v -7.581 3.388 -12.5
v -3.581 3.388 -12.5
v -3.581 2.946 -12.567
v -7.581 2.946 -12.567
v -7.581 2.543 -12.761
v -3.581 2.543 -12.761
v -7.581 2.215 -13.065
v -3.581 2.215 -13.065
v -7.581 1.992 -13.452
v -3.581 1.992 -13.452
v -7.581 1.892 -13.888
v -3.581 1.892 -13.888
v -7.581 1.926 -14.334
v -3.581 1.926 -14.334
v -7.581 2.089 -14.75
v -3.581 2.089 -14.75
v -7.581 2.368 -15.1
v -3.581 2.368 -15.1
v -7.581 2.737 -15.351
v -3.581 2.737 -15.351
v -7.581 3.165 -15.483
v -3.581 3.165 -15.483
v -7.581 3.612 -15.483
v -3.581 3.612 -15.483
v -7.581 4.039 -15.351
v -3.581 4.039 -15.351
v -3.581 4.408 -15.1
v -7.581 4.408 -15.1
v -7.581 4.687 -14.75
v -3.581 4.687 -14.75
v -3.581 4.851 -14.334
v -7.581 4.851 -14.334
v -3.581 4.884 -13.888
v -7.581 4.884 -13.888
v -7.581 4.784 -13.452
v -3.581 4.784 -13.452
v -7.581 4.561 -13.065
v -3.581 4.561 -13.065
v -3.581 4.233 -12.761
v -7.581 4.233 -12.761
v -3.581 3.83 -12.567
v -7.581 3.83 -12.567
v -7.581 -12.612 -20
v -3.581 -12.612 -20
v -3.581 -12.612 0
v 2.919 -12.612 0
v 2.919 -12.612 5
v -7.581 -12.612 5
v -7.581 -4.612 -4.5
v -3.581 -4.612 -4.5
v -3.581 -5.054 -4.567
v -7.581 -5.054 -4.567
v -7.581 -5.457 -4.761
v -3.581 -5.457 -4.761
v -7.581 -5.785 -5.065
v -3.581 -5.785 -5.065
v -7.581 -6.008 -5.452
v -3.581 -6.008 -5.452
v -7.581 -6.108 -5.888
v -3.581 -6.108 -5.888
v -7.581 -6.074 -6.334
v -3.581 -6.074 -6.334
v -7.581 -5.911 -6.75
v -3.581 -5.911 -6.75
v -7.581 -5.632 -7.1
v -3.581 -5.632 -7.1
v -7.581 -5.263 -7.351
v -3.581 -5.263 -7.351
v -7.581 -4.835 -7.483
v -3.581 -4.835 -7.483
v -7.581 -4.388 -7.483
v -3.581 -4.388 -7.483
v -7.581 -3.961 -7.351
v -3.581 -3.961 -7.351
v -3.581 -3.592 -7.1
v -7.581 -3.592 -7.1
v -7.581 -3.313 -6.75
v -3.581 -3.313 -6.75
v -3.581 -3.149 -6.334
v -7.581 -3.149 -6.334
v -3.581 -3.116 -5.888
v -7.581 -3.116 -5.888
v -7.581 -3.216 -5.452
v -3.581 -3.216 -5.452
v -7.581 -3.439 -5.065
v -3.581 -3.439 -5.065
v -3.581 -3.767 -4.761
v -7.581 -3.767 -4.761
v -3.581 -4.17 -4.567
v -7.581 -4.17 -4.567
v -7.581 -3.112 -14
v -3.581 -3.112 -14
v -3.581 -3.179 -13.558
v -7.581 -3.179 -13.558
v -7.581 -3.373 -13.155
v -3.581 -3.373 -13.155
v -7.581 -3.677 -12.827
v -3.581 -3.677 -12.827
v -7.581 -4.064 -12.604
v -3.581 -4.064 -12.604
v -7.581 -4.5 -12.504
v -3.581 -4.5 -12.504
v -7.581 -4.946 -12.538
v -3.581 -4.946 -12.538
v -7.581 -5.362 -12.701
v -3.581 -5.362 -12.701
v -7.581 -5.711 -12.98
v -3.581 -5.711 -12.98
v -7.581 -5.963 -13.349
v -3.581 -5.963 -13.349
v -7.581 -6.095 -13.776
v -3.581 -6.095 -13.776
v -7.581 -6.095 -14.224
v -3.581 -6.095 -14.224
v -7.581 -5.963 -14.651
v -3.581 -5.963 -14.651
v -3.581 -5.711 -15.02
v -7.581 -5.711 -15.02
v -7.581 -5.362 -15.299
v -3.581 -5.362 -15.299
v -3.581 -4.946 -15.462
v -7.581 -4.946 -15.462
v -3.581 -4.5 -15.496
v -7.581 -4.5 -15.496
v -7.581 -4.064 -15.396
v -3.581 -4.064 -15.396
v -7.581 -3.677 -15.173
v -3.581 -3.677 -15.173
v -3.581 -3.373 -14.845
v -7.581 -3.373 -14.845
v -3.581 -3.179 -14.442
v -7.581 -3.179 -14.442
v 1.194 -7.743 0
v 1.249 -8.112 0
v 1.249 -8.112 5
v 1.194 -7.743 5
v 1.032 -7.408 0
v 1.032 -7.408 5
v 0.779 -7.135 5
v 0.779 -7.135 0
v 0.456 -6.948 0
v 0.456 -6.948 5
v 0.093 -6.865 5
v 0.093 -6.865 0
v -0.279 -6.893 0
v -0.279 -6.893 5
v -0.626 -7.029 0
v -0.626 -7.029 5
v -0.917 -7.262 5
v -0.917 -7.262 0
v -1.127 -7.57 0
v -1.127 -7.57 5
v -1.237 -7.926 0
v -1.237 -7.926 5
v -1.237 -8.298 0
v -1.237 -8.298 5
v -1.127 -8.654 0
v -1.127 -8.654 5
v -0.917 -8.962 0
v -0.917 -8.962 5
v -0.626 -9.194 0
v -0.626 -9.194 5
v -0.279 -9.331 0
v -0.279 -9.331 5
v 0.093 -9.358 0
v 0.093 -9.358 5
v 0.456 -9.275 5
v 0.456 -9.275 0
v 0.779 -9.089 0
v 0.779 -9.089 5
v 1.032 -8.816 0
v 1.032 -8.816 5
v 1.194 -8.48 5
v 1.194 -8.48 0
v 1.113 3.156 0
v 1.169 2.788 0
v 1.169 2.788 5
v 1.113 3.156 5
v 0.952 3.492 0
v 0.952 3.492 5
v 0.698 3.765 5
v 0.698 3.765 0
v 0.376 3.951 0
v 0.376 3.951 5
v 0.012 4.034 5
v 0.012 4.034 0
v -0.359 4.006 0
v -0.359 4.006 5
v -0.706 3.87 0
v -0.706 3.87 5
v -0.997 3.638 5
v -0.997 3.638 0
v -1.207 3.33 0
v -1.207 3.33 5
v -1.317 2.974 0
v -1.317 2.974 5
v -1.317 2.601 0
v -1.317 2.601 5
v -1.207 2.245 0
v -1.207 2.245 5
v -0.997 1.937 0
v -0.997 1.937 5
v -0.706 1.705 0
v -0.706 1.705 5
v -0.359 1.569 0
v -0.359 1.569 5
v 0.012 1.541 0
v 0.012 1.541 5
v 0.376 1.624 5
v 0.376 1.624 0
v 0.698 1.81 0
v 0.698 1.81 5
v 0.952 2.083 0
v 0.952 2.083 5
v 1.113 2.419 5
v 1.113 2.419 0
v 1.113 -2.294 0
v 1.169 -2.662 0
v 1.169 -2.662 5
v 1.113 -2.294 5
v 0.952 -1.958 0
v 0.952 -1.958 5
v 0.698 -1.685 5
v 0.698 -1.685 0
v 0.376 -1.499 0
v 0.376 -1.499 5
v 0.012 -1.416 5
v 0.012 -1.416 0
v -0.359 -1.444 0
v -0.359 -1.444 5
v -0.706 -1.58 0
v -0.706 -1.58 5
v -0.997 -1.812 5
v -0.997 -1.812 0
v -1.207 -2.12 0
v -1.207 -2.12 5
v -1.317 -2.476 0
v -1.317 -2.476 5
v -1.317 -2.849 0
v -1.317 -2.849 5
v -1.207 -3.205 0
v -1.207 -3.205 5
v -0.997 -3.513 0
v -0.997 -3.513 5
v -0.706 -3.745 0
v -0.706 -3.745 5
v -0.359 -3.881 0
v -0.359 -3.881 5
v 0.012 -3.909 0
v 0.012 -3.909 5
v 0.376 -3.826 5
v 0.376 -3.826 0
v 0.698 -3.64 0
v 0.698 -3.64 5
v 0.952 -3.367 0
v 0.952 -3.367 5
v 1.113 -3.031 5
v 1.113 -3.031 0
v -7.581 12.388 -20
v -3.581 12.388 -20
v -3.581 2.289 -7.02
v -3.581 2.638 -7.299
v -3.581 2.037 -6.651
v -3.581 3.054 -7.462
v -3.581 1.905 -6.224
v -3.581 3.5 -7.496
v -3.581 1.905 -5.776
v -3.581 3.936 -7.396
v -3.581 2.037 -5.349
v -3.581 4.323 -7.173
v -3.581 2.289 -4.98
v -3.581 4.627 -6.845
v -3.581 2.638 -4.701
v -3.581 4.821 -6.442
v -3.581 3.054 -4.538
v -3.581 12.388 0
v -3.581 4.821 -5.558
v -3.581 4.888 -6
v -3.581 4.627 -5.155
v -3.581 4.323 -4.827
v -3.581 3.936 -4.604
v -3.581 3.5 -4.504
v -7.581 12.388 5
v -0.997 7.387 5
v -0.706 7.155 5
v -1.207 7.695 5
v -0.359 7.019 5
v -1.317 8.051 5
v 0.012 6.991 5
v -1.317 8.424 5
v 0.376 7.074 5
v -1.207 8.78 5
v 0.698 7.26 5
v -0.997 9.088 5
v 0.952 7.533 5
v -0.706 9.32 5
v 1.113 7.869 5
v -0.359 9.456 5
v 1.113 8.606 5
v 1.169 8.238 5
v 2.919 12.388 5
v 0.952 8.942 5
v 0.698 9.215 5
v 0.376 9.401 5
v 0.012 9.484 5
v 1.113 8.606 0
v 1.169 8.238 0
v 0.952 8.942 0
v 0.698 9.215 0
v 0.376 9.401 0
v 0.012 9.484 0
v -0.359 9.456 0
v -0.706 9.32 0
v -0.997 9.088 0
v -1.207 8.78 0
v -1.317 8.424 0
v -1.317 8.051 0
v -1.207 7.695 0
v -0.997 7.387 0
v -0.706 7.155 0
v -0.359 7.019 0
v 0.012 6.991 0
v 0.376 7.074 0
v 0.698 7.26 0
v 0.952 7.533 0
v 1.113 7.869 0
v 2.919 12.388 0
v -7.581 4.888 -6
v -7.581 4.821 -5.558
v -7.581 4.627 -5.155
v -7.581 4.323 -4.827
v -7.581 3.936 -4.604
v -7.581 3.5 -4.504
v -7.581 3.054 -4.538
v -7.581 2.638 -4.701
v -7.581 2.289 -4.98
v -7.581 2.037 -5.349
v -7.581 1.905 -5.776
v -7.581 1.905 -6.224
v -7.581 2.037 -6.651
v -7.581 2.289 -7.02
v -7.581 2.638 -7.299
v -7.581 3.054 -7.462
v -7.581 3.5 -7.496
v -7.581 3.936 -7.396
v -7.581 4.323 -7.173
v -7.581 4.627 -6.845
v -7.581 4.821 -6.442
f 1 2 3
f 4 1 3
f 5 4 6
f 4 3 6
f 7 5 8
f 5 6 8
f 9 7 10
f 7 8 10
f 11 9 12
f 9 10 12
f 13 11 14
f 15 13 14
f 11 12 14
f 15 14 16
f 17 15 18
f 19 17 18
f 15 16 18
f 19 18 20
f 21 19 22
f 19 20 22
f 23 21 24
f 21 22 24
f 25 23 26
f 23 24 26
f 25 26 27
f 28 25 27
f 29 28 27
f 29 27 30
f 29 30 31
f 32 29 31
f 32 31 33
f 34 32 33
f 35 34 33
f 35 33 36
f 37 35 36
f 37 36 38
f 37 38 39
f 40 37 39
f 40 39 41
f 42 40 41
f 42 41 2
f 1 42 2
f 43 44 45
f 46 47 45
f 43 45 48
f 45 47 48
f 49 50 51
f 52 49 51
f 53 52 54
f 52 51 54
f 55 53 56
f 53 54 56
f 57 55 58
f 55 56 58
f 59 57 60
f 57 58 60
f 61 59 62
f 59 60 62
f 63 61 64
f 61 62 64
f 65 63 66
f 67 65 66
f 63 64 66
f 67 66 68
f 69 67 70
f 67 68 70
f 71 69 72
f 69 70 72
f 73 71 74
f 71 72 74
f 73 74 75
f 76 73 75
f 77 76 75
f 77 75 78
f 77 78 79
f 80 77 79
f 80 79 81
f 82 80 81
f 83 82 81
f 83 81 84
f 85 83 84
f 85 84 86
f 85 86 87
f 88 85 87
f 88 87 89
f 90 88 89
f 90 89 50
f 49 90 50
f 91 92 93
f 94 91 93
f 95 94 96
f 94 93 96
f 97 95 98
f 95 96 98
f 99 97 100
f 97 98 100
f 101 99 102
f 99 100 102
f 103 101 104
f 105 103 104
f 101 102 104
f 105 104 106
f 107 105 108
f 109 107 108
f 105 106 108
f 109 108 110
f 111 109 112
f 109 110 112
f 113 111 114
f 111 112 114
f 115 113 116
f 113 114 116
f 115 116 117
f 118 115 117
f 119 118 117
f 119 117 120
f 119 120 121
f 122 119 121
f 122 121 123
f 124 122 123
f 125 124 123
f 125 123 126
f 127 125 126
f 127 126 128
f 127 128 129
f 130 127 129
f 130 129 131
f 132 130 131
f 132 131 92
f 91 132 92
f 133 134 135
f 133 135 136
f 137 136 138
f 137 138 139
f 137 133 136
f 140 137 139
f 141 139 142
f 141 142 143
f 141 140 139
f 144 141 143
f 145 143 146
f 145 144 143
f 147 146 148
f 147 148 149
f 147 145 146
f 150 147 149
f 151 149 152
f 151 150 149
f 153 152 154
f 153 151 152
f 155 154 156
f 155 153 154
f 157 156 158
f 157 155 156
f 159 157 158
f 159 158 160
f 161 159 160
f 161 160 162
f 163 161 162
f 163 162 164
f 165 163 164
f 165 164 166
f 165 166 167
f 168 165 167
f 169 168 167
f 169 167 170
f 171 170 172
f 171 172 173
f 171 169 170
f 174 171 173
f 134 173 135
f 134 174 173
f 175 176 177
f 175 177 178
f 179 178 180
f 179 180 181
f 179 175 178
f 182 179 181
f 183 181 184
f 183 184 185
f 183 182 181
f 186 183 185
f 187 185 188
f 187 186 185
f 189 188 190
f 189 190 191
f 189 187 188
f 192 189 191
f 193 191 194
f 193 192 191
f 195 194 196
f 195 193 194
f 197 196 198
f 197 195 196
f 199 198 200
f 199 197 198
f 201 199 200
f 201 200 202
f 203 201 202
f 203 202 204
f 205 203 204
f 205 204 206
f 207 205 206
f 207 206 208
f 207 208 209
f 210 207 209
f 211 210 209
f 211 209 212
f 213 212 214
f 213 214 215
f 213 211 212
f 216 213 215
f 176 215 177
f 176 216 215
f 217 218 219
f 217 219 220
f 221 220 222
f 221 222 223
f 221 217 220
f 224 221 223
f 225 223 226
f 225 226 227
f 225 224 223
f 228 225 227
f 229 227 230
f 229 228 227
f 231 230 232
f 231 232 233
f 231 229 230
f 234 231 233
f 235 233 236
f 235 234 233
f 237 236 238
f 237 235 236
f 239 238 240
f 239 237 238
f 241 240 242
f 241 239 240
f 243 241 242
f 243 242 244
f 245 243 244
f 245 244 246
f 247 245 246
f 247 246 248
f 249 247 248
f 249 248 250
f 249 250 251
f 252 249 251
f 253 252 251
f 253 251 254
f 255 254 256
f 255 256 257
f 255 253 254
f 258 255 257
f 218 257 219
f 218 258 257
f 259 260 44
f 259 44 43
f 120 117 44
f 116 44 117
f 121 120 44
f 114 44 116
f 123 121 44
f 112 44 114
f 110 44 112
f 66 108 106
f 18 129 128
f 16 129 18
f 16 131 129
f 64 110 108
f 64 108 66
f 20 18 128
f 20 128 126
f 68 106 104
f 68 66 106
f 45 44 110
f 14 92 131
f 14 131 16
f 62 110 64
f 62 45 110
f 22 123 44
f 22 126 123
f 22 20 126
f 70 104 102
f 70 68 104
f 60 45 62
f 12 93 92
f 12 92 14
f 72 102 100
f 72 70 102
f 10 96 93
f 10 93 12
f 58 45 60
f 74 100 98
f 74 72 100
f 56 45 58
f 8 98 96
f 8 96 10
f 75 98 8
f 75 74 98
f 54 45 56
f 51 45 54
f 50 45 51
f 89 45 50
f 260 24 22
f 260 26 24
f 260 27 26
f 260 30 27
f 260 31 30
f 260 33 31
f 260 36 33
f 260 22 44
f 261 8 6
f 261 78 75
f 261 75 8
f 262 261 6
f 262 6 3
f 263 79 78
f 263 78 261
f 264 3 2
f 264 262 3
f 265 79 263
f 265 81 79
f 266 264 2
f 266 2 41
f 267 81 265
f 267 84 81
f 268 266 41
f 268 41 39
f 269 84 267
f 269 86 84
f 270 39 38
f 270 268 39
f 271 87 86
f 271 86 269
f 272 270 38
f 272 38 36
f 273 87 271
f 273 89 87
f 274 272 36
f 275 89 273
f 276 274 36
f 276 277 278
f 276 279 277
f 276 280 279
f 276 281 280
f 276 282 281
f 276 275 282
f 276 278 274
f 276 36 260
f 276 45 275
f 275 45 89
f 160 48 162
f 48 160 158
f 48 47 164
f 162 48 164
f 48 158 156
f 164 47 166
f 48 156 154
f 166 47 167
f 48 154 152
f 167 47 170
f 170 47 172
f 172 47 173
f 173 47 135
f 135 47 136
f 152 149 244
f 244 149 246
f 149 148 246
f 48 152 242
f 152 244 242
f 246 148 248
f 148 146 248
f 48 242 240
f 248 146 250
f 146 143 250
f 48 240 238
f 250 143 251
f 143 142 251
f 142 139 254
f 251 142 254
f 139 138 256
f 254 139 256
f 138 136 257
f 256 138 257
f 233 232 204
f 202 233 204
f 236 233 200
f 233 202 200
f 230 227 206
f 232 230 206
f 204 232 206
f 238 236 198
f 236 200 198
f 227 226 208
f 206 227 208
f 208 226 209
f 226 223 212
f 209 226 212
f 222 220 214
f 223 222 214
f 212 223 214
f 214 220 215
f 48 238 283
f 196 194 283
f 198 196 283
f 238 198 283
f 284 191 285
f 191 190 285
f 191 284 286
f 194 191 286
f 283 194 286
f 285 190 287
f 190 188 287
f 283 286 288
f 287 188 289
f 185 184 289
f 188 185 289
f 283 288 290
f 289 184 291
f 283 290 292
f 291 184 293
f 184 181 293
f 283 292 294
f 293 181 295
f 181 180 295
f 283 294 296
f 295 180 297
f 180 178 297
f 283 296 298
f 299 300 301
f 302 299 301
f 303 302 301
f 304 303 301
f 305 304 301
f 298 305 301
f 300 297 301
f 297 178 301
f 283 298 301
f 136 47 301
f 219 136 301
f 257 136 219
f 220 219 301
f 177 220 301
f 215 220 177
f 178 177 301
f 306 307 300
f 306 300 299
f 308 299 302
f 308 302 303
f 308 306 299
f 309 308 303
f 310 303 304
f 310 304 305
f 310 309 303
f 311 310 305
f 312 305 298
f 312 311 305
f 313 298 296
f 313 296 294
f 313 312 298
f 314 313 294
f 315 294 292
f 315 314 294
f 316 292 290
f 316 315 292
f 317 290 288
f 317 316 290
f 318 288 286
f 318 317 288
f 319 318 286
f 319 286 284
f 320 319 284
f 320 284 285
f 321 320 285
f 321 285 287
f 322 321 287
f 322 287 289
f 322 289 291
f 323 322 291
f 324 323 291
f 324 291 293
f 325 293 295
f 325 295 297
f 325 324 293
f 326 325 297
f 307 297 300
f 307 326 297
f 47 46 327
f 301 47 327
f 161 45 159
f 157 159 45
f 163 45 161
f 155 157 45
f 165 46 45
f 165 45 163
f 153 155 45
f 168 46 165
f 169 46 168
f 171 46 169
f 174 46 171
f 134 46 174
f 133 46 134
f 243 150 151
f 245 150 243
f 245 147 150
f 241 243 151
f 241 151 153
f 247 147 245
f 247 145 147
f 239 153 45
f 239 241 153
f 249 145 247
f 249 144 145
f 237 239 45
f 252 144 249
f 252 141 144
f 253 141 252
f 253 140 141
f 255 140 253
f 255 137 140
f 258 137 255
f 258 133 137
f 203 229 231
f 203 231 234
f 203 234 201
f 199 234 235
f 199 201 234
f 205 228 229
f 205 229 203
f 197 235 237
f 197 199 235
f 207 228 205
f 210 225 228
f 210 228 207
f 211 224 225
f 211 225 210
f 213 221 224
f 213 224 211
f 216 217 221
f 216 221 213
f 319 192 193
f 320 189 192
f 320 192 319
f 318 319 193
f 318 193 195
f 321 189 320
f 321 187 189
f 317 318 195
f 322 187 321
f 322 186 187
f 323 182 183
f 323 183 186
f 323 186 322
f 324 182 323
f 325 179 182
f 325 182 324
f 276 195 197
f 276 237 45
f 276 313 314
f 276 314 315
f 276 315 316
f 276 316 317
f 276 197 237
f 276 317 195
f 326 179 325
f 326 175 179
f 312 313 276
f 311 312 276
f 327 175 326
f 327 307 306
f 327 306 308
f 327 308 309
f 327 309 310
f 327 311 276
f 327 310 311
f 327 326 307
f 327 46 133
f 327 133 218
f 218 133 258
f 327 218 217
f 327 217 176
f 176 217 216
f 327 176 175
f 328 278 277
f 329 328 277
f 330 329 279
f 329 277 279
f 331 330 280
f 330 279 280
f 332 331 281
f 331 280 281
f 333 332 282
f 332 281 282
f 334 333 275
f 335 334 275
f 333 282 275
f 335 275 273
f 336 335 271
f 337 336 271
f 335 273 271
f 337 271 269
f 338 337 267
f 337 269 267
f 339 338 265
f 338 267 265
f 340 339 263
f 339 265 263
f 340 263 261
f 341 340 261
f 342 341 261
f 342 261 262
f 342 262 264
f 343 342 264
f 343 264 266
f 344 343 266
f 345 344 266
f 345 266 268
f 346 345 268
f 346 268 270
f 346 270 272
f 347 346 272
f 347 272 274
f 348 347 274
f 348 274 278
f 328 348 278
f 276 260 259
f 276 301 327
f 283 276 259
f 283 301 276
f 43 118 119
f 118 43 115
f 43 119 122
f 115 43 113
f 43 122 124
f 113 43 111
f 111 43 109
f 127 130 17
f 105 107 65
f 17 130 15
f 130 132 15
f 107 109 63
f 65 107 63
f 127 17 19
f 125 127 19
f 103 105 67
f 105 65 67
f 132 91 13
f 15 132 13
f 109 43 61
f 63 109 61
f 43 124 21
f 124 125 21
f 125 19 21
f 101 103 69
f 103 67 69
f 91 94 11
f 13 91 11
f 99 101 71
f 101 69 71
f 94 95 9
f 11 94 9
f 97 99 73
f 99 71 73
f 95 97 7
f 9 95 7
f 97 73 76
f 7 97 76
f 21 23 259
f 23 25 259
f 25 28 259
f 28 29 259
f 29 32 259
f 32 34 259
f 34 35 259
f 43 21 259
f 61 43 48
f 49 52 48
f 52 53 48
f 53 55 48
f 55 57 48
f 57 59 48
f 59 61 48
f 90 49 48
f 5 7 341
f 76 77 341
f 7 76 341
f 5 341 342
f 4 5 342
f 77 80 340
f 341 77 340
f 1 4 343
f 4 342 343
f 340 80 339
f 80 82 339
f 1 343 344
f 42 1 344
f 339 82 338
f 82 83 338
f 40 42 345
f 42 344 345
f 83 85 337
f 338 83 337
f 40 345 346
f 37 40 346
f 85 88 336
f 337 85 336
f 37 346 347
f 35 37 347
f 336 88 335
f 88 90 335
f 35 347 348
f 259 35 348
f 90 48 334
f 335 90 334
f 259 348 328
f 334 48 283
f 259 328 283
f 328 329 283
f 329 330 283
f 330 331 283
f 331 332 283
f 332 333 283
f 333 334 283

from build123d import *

# Parameters (mm, degrees)
SKETCH_1_R          = 1.25
EXTRUDE_1_DEPTH     = 5
SKETCH_2_W          = 5
SKETCH_2_H          = 25
EXTRUDE_2_DEPTH     = 4
SKETCH_3_W          = 4
SKETCH_3_H          = 25
EXTRUDE_3_DEPTH     = 20
SKETCH_4_R          = 1.5
CUT_EXTRUDE_1_DEPTH = 20


with BuildPart() as part:
    # 草图1 → 凸台-拉伸1 (new body)
    with BuildSketch(Plane.XY):
        Polygon((-3.581151343, -8.027992706), (-3.581151343, -12.611885422), (2.918848657, -12.611885422), (2.918848657, -6.641886627), (2.918848657, 12.388114578), (-3.581151343, 12.388114578), align=None)
        with Locations((-0.081151343, 8.237522913)):
            Circle(SKETCH_1_R, mode=Mode.SUBTRACT)
        with Locations((-0.081151343, 2.787522913)):
            Circle(SKETCH_1_R, mode=Mode.SUBTRACT)
        with Locations((-0.081151343, -2.662477087)):
            Circle(SKETCH_1_R, mode=Mode.SUBTRACT)
        with Locations((-0.000846901, -8.111885422)):
            Circle(SKETCH_1_R, mode=Mode.SUBTRACT)
    extrude(amount=EXTRUDE_1_DEPTH)

    # 草图2 → 凸台-拉伸2 (add)
    with BuildSketch(Plane.ZY.offset(3.581151343)):
        with Locations((2.5, -0.111885422)):
            Rectangle(SKETCH_2_W, SKETCH_2_H)
    extrude(amount=EXTRUDE_2_DEPTH)

    # 草图3 → 凸台-拉伸3 (add)
    with BuildSketch(Plane(origin=(0, 0, 0), x_dir=(-1, 0, 0), z_dir=(0, 0, -1))):
        with Locations((5.581151343, -0.111885422)):
            Rectangle(SKETCH_3_W, SKETCH_3_H)
    extrude(amount=EXTRUDE_3_DEPTH)

    # 草图4 → 切除-拉伸1 (cut)
    with BuildSketch(Plane(origin=(-3.581151343, 0, 0), x_dir=(0, 0, -1), z_dir=(1, 0, 0))):
        with Locations(Location((6, 3.388114578, 0), (0, 0, 90))):
            Circle(SKETCH_4_R)
        with Locations(Location((14, 3.388114578, 0), (0, 0, 180))):
            Circle(SKETCH_4_R)
        with Locations(Location((14, -4.611885422, 0), (0, 0, 90))):
            Circle(SKETCH_4_R)
        with Locations(Location((6, -4.611885422, 0), (0, 0, 180))):
            Circle(SKETCH_4_R)
    extrude(amount=-CUT_EXTRUDE_1_DEPTH, mode=Mode.SUBTRACT)


solid = part.part
